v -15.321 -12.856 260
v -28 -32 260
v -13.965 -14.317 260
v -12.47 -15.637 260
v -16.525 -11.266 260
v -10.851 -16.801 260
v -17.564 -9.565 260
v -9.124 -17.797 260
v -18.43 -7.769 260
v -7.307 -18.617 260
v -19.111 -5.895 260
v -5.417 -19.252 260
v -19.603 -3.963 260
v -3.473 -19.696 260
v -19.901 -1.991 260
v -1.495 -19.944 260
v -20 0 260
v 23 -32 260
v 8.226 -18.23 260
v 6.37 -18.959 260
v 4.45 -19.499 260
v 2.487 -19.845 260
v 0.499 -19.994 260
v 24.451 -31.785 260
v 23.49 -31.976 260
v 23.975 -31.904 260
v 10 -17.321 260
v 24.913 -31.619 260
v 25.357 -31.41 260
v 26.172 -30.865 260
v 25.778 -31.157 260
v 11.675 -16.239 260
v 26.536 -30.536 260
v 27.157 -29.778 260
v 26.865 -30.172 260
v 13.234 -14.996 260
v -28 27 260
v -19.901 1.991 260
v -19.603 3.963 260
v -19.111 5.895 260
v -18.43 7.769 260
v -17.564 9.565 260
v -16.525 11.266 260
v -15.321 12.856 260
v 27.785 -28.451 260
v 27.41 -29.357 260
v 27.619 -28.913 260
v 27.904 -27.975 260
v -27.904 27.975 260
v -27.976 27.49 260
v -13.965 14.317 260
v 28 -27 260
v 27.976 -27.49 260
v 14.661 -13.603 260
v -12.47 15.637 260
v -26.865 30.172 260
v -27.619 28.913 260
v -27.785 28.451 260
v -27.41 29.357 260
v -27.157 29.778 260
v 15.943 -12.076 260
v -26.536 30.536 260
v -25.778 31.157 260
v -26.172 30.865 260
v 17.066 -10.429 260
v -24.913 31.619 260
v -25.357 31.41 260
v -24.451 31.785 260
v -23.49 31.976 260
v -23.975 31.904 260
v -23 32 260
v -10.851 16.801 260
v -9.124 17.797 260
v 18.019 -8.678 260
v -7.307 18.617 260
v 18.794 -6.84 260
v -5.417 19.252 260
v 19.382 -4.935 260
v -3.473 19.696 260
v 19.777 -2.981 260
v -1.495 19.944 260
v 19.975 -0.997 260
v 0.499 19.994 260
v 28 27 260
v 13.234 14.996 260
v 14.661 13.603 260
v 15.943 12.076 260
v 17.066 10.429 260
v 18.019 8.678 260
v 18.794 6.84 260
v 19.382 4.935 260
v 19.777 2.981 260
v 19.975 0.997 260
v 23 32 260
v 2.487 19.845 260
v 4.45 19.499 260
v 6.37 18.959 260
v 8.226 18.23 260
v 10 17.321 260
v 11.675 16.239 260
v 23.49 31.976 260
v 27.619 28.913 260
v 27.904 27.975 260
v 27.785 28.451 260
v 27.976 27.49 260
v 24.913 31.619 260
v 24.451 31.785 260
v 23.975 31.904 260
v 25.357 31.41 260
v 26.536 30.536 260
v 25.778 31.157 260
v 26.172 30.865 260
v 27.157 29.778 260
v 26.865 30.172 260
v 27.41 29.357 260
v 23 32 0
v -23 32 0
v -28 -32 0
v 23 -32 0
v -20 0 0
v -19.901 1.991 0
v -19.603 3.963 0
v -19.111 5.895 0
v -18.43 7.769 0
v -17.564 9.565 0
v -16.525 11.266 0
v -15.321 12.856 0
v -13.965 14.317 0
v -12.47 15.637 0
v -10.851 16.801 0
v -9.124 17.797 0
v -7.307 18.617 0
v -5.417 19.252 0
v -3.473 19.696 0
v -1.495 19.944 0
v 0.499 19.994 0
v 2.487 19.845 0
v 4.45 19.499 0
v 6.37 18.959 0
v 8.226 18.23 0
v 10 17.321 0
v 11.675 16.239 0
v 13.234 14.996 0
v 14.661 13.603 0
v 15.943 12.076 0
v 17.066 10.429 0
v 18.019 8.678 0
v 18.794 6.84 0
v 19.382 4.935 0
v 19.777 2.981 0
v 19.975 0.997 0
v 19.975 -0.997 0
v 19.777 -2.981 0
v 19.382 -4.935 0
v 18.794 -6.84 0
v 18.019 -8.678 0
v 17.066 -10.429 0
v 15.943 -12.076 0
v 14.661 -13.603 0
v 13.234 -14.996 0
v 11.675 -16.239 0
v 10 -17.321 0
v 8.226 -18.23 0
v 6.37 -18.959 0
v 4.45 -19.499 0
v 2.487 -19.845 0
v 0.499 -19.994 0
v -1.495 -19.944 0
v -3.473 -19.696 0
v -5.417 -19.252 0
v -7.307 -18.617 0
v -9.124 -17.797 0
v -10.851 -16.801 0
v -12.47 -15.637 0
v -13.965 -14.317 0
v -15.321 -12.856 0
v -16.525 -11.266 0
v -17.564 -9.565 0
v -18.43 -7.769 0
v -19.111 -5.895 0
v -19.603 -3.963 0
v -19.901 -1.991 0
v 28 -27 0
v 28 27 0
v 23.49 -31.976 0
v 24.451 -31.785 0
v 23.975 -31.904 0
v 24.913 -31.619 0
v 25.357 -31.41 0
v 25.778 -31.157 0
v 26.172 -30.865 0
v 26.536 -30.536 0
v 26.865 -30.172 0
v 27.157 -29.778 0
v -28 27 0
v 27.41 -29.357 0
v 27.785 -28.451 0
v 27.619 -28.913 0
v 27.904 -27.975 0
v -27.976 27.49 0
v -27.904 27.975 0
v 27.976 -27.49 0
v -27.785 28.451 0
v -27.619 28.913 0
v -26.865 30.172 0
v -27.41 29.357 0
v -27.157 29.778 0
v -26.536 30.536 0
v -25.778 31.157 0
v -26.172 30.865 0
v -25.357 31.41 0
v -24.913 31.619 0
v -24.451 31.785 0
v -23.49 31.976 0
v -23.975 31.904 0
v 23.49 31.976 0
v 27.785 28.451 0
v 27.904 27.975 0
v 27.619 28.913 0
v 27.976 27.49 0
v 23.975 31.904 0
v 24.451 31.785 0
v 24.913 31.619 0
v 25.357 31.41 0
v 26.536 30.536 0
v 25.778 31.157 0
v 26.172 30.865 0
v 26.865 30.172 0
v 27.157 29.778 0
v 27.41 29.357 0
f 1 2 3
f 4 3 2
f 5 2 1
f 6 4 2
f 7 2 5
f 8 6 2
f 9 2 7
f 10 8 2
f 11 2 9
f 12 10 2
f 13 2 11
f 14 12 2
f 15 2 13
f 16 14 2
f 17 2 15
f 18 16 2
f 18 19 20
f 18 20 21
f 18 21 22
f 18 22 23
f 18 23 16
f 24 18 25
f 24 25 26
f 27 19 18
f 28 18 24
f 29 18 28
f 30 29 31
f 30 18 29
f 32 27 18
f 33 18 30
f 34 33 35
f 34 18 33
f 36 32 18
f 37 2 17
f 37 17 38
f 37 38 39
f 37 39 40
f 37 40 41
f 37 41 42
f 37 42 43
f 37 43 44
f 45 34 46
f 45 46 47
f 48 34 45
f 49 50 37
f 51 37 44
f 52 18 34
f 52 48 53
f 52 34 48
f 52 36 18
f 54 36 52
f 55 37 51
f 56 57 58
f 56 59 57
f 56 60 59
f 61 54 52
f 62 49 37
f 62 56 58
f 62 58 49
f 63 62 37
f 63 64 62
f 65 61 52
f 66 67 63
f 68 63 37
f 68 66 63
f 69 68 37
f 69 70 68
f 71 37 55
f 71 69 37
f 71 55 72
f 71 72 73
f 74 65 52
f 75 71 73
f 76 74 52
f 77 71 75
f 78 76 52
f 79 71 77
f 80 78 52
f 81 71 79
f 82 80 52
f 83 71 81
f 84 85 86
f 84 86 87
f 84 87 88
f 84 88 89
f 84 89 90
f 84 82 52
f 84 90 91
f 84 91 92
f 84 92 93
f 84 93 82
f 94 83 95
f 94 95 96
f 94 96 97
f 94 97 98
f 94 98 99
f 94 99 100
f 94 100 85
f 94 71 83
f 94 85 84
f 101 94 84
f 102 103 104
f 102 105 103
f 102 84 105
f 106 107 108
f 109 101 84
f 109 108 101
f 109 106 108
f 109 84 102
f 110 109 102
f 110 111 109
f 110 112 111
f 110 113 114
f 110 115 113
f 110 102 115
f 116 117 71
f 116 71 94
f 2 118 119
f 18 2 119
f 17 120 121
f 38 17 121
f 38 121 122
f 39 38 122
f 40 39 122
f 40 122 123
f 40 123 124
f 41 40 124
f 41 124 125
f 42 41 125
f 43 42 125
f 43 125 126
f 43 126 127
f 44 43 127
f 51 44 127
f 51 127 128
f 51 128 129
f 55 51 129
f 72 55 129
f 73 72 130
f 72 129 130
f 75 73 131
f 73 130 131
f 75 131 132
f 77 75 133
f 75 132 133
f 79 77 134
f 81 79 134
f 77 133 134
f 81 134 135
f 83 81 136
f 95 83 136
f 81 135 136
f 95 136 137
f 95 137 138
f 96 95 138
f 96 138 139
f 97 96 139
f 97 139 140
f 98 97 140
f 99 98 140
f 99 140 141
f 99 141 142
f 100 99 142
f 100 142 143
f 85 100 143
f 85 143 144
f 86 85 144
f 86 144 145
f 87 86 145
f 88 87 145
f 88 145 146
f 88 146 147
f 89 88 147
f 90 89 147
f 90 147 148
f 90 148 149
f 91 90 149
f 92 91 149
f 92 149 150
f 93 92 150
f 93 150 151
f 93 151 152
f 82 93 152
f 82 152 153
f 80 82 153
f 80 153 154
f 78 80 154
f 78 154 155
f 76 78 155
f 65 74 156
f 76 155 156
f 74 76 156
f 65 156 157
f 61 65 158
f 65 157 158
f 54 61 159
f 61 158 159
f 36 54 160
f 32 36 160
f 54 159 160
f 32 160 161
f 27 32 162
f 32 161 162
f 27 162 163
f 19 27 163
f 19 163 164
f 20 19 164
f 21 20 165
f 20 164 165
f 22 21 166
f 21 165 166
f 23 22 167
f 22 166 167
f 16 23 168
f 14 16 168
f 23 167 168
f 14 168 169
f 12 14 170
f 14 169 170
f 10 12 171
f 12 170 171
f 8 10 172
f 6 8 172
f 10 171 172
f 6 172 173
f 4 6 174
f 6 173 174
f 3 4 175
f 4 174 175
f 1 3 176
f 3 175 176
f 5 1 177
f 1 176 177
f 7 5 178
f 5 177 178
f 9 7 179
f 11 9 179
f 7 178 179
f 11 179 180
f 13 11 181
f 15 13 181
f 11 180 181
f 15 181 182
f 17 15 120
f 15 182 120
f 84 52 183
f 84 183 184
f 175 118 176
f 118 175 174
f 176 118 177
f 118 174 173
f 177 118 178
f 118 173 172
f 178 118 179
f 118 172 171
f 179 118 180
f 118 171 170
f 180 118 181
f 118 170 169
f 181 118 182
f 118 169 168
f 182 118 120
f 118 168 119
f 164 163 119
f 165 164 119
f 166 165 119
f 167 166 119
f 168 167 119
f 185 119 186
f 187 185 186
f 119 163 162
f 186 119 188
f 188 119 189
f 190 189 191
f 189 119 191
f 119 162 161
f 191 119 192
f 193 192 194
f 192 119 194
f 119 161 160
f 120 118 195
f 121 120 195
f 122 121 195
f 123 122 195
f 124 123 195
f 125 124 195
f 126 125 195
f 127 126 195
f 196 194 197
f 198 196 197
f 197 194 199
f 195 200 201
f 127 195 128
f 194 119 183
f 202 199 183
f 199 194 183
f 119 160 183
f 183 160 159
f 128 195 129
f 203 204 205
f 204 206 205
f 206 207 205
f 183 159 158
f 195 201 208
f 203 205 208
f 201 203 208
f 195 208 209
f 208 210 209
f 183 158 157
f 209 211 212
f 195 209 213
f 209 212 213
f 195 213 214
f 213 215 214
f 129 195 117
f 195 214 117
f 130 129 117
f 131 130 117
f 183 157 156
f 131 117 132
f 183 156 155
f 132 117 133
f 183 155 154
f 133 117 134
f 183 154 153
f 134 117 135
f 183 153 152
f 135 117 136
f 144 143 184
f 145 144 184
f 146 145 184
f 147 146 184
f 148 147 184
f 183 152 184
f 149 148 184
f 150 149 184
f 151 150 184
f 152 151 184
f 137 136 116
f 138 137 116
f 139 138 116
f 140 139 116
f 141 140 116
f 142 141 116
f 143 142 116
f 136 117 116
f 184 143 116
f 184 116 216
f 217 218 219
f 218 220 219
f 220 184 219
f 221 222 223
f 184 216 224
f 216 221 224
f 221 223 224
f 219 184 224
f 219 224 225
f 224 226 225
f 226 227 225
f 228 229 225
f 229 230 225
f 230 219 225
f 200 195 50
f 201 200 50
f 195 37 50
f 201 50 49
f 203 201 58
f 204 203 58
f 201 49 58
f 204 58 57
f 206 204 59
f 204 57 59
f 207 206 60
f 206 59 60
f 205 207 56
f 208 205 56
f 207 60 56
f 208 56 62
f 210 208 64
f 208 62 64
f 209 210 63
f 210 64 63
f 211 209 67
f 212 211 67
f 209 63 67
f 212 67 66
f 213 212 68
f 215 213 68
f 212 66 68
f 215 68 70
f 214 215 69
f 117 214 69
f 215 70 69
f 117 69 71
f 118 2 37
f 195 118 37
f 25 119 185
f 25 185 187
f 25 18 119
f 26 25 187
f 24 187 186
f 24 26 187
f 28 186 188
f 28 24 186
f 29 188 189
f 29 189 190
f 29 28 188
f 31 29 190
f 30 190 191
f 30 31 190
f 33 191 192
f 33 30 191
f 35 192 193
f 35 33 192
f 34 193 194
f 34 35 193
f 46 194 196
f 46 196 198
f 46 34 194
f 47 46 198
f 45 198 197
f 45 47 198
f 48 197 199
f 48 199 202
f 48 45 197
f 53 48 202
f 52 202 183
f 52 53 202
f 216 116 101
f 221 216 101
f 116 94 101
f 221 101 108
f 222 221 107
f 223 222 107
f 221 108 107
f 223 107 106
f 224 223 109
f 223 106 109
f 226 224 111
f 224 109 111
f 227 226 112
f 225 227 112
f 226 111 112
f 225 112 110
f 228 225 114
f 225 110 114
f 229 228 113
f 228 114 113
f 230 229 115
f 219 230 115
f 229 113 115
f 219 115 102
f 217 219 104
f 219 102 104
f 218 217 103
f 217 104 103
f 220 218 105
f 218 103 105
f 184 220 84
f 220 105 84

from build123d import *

# Parameters (mm, degrees)
SKETCH_8_W          = 56
SKETCH_8_H          = 64
EXTRUDE_1_DEPTH     = 260
SKETCH_9_R          = 20
CUT_EXTRUDE_1_DEPTH = 264.453980801
FILLET_1_R          = 5


with BuildPart() as part:
    # 草图8 → 凸台-拉伸1 (new body)
    with BuildSketch(Plane.XY):
        Rectangle(SKETCH_8_W, SKETCH_8_H)
    extrude(amount=EXTRUDE_1_DEPTH)

    # 草图9 → 切除-拉伸1 (cut, through all)
    with BuildSketch(Plane(origin=(0, 0, 0), x_dir=(-1, 0, 0), z_dir=(0, 0, -1))):
        Circle(SKETCH_9_R)
    extrude(amount=-CUT_EXTRUDE_1_DEPTH, mode=Mode.SUBTRACT)

    # 圆角1
    fillet_1_edges = [part.edges().sort_by_distance(p)[0] for p in [
        (-28, 32, 130),
        (28, 32, 130),
        (28, -32, 130),
    ]]
    fillet(fillet_1_edges, radius=FILLET_1_R)


solid = part.part
